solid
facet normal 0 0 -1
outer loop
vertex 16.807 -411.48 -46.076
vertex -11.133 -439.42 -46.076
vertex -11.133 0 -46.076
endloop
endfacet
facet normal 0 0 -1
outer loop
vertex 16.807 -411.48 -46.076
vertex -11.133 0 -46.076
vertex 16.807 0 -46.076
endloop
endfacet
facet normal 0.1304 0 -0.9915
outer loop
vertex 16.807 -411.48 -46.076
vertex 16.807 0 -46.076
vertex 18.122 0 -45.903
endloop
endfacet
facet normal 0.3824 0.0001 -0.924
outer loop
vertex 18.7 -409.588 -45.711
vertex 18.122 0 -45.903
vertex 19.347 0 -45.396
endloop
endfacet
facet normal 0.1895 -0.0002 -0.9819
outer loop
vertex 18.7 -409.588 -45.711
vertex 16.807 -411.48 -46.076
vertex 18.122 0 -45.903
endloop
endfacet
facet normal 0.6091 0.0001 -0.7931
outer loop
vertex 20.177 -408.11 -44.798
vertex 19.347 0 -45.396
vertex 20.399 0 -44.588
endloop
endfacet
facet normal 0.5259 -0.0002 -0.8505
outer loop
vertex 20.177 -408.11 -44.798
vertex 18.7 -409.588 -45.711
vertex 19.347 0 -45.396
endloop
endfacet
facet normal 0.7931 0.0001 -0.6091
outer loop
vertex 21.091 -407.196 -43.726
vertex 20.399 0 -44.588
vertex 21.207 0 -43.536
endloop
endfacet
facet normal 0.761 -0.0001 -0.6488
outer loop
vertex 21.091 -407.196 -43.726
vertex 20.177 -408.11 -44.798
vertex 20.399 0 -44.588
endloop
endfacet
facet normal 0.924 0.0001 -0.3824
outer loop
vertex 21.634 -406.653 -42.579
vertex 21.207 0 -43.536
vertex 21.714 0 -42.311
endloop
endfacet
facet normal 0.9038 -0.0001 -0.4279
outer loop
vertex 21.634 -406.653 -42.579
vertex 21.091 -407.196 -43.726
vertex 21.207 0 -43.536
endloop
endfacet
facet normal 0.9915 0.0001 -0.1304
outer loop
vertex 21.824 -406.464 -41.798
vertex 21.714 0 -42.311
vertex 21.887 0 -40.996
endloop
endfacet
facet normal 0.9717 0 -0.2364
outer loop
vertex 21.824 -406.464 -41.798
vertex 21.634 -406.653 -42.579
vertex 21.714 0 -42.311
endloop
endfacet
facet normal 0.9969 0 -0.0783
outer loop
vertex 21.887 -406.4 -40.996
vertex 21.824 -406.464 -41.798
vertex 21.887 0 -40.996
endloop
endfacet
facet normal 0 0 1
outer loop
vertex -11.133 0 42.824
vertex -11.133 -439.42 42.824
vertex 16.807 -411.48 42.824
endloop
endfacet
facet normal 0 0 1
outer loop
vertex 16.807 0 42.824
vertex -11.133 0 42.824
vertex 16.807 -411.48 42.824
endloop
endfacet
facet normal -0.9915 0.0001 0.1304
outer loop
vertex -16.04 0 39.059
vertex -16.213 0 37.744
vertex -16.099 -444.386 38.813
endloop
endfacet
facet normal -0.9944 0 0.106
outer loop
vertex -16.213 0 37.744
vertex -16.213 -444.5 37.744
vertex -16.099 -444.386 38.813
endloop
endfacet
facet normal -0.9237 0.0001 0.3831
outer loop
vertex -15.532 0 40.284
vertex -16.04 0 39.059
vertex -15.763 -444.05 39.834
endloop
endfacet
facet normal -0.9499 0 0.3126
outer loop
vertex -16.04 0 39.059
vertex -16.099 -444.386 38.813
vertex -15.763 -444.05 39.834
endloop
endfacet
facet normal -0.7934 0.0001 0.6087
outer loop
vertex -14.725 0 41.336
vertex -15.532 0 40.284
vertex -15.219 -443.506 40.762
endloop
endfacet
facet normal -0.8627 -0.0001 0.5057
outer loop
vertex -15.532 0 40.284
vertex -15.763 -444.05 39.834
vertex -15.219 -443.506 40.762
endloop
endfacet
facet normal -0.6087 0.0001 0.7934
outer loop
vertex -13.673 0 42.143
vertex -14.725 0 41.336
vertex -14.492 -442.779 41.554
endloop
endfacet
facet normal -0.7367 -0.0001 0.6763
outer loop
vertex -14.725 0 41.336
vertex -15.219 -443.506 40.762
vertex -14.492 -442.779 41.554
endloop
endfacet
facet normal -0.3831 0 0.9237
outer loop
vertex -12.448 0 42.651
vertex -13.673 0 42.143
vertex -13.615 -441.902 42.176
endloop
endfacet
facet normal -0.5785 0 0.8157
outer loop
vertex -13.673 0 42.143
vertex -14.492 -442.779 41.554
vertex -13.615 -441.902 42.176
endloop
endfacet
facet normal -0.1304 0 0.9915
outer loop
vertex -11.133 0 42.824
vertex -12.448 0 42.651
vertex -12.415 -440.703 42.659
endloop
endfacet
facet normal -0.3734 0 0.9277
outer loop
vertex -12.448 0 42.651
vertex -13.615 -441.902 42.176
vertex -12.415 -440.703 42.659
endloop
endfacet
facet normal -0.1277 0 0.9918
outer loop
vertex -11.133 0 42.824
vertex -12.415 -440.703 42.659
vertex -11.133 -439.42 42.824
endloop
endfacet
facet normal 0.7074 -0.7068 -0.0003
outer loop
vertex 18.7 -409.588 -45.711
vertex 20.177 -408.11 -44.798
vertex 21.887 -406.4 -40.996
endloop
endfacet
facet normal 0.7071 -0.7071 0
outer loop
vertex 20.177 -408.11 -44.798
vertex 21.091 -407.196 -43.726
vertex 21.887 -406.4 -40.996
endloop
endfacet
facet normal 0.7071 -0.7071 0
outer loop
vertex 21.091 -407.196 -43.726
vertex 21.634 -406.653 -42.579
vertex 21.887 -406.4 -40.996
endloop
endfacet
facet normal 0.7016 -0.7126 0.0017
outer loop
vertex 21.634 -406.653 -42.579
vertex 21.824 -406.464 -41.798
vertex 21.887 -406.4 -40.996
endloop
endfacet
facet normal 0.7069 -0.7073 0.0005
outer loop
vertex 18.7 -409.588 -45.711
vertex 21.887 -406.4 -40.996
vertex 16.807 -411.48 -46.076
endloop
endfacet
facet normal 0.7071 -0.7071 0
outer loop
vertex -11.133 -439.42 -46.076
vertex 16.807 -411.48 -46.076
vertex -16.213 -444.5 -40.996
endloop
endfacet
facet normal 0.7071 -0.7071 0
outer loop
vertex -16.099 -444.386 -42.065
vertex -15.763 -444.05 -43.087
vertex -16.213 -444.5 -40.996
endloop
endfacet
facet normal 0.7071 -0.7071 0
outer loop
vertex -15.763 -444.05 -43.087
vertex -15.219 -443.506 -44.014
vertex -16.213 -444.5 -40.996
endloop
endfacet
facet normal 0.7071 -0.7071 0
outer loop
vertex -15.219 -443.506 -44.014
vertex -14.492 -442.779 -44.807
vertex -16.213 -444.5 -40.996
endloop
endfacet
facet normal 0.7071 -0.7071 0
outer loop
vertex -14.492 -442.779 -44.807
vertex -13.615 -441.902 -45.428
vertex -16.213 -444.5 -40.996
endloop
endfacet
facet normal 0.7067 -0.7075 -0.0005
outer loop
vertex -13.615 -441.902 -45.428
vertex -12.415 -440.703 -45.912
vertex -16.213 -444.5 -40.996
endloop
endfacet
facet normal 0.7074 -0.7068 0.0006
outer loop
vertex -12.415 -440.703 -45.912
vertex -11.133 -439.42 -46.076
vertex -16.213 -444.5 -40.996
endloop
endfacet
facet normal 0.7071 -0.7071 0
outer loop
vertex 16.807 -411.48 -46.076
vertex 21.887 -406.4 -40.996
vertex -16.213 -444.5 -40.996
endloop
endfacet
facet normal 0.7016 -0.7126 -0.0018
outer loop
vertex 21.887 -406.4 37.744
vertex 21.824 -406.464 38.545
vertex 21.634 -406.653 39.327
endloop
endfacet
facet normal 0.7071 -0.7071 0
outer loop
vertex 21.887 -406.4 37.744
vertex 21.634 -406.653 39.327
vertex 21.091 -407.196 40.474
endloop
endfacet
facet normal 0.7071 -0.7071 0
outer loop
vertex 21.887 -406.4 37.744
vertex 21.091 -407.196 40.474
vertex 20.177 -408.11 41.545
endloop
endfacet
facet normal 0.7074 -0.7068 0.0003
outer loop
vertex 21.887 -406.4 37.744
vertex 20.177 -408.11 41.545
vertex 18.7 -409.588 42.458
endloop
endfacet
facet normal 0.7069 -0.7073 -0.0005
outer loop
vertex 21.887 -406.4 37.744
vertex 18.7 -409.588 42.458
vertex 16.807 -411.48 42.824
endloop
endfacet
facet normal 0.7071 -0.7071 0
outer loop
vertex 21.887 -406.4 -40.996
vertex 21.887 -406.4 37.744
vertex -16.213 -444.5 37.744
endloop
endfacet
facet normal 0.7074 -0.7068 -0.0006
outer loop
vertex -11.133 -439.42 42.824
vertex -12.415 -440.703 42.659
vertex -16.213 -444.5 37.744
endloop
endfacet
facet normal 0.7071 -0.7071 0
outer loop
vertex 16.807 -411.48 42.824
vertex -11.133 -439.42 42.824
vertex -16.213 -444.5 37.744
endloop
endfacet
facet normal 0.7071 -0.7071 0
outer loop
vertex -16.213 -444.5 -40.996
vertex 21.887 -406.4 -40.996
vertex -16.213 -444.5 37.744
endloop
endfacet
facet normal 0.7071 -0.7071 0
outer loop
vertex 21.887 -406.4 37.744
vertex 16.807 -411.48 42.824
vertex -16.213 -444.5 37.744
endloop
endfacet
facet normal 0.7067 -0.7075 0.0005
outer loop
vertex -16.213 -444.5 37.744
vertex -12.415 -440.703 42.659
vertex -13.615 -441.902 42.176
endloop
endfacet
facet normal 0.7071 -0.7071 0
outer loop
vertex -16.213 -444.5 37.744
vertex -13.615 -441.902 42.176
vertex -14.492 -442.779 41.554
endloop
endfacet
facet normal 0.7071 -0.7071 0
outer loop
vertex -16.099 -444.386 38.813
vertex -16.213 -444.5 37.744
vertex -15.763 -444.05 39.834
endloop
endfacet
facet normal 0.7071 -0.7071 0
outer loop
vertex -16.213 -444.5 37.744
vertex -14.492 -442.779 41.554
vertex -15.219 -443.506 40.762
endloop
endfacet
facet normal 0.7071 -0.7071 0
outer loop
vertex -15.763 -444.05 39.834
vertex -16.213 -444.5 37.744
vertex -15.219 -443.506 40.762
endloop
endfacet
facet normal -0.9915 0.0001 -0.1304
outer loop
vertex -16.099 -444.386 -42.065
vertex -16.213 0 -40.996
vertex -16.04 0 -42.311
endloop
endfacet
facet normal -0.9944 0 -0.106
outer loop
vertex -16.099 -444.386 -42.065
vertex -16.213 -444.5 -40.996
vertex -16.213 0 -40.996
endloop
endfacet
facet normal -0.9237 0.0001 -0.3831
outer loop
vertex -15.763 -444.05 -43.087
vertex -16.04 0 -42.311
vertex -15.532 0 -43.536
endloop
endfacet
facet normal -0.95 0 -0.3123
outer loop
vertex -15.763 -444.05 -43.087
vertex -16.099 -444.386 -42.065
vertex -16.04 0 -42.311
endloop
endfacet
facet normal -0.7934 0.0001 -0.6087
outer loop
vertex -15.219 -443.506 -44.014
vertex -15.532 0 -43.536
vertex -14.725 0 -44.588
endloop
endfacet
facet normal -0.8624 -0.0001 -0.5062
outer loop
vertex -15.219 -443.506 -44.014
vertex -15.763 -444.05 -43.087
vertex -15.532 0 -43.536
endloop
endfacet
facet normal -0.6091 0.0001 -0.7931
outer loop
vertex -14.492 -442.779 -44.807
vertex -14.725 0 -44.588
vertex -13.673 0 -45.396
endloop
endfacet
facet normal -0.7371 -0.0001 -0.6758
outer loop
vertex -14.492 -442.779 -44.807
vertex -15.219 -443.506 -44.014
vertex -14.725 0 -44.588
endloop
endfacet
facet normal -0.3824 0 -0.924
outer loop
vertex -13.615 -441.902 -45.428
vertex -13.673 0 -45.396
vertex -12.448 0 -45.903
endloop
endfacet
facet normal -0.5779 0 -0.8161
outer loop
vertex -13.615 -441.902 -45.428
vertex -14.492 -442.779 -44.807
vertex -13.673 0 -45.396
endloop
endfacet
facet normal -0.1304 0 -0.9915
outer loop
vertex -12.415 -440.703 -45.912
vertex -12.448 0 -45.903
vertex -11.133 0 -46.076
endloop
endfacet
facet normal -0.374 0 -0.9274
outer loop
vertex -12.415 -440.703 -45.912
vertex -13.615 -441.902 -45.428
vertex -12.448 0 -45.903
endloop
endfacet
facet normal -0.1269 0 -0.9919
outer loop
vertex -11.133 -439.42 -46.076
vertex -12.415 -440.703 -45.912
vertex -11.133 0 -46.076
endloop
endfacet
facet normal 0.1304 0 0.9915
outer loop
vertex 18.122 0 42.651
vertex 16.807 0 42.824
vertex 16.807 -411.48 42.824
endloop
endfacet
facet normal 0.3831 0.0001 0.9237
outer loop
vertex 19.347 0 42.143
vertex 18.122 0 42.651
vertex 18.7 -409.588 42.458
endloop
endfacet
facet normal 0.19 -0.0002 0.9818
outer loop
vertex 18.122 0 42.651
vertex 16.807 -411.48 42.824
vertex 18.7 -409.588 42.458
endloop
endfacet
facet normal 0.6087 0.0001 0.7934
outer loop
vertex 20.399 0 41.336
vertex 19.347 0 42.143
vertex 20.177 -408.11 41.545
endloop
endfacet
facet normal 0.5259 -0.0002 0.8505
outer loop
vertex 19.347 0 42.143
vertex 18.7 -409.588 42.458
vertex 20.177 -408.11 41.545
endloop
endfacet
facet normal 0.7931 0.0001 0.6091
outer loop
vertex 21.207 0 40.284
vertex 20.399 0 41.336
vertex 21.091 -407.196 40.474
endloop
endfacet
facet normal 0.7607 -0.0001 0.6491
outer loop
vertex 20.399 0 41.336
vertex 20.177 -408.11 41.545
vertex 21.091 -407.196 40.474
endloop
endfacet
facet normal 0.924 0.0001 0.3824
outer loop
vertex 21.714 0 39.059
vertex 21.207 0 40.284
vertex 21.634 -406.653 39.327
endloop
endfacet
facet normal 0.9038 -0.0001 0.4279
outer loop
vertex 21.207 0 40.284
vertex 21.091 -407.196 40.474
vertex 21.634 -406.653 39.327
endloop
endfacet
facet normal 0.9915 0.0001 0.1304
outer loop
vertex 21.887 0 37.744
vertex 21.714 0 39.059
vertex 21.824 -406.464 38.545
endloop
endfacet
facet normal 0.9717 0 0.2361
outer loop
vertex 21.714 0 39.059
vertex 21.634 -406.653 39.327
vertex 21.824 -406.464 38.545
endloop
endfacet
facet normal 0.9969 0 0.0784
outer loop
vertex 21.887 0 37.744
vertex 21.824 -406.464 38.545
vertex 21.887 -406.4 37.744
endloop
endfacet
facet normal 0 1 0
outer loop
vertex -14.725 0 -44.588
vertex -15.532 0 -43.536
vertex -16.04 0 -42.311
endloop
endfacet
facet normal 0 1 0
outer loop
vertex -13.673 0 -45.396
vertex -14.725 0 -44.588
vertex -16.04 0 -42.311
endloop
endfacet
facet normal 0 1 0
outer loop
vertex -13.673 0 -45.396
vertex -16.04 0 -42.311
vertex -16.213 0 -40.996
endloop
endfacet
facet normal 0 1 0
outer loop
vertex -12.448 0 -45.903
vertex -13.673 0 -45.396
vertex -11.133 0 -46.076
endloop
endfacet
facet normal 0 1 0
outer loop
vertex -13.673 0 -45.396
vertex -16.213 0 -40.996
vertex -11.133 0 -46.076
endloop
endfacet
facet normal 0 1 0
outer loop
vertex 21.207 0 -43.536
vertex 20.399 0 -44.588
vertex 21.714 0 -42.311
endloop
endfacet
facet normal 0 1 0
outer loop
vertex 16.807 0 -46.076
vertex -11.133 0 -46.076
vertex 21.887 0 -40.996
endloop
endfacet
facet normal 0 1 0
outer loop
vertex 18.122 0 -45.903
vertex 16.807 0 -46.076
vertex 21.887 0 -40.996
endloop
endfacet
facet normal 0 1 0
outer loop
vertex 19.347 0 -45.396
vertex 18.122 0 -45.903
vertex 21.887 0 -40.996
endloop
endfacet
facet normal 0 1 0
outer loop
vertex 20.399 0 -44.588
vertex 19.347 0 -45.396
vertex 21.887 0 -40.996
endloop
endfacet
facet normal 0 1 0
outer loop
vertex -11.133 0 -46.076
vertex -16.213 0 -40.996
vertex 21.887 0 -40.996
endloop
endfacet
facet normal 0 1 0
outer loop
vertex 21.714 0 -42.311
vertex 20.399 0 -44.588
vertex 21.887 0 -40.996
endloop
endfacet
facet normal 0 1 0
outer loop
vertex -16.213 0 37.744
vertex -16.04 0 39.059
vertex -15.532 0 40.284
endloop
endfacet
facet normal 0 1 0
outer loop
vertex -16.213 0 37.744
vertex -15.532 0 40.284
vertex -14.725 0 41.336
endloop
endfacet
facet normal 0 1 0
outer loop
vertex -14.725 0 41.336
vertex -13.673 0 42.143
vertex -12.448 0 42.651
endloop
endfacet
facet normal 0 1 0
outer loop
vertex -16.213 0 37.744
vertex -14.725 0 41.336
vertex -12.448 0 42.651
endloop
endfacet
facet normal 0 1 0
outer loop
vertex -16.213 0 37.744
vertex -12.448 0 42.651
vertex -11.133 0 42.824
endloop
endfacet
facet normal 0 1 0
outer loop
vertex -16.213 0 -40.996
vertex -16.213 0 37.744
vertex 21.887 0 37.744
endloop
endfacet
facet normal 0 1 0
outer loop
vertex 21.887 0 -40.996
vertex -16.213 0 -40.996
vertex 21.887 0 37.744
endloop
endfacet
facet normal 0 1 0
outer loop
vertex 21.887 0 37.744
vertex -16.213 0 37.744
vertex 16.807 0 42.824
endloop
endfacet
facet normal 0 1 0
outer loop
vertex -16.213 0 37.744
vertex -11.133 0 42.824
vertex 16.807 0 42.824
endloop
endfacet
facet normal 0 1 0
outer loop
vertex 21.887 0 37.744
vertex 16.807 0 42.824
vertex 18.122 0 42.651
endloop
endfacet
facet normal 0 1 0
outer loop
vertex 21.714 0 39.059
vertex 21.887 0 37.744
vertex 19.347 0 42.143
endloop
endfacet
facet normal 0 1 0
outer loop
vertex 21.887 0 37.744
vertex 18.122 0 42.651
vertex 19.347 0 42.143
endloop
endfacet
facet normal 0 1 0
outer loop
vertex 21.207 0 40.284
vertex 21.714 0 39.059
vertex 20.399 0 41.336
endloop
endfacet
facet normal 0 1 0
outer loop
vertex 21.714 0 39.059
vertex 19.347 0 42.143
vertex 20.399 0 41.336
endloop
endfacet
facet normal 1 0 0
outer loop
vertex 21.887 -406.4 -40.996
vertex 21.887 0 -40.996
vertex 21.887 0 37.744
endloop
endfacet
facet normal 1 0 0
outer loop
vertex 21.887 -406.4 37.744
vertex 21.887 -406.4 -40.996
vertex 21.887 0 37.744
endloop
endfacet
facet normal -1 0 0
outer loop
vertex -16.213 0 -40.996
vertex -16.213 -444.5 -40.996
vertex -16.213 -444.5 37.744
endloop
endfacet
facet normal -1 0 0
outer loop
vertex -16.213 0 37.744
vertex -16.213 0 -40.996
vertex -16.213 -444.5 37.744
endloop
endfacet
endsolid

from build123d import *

# Parameters (mm, degrees)
F0_W     = 38.1
F0_H     = 88.9
F1_DEPTH = 444.5
F3_DEPTH = 88.9
F4_R     = 5.08


with BuildPart() as f1:
    # F0 (on Front) → F1 (new body)
    with BuildSketch(Plane.XZ):
        with Locations((2.837234, -1.626216)):
            Rectangle(F0_W, F0_H)
    extrude(amount=F1_DEPTH)

    # F2 (on face) → F3 (cut)
    with BuildSketch(Plane.XY.offset(42.823784)):
        Polygon((21.887234, -406.4), (-16.212766, -444.5), (21.887234, -444.5), align=None)
    extrude(amount=-F3_DEPTH, mode=Mode.SUBTRACT)

    # F4
    f4_edges = [f1.edges().sort_by_distance(p)[0] for p in [
        (21.887234, -203.2, 42.823784),
        (21.887234, -203.2, -46.076216),
        (-16.212766, -222.25, 42.823784),
        (-16.212766, -222.25, -46.076216),
    ]]
    fillet(f4_edges, radius=F4_R)


solid = f1.part
